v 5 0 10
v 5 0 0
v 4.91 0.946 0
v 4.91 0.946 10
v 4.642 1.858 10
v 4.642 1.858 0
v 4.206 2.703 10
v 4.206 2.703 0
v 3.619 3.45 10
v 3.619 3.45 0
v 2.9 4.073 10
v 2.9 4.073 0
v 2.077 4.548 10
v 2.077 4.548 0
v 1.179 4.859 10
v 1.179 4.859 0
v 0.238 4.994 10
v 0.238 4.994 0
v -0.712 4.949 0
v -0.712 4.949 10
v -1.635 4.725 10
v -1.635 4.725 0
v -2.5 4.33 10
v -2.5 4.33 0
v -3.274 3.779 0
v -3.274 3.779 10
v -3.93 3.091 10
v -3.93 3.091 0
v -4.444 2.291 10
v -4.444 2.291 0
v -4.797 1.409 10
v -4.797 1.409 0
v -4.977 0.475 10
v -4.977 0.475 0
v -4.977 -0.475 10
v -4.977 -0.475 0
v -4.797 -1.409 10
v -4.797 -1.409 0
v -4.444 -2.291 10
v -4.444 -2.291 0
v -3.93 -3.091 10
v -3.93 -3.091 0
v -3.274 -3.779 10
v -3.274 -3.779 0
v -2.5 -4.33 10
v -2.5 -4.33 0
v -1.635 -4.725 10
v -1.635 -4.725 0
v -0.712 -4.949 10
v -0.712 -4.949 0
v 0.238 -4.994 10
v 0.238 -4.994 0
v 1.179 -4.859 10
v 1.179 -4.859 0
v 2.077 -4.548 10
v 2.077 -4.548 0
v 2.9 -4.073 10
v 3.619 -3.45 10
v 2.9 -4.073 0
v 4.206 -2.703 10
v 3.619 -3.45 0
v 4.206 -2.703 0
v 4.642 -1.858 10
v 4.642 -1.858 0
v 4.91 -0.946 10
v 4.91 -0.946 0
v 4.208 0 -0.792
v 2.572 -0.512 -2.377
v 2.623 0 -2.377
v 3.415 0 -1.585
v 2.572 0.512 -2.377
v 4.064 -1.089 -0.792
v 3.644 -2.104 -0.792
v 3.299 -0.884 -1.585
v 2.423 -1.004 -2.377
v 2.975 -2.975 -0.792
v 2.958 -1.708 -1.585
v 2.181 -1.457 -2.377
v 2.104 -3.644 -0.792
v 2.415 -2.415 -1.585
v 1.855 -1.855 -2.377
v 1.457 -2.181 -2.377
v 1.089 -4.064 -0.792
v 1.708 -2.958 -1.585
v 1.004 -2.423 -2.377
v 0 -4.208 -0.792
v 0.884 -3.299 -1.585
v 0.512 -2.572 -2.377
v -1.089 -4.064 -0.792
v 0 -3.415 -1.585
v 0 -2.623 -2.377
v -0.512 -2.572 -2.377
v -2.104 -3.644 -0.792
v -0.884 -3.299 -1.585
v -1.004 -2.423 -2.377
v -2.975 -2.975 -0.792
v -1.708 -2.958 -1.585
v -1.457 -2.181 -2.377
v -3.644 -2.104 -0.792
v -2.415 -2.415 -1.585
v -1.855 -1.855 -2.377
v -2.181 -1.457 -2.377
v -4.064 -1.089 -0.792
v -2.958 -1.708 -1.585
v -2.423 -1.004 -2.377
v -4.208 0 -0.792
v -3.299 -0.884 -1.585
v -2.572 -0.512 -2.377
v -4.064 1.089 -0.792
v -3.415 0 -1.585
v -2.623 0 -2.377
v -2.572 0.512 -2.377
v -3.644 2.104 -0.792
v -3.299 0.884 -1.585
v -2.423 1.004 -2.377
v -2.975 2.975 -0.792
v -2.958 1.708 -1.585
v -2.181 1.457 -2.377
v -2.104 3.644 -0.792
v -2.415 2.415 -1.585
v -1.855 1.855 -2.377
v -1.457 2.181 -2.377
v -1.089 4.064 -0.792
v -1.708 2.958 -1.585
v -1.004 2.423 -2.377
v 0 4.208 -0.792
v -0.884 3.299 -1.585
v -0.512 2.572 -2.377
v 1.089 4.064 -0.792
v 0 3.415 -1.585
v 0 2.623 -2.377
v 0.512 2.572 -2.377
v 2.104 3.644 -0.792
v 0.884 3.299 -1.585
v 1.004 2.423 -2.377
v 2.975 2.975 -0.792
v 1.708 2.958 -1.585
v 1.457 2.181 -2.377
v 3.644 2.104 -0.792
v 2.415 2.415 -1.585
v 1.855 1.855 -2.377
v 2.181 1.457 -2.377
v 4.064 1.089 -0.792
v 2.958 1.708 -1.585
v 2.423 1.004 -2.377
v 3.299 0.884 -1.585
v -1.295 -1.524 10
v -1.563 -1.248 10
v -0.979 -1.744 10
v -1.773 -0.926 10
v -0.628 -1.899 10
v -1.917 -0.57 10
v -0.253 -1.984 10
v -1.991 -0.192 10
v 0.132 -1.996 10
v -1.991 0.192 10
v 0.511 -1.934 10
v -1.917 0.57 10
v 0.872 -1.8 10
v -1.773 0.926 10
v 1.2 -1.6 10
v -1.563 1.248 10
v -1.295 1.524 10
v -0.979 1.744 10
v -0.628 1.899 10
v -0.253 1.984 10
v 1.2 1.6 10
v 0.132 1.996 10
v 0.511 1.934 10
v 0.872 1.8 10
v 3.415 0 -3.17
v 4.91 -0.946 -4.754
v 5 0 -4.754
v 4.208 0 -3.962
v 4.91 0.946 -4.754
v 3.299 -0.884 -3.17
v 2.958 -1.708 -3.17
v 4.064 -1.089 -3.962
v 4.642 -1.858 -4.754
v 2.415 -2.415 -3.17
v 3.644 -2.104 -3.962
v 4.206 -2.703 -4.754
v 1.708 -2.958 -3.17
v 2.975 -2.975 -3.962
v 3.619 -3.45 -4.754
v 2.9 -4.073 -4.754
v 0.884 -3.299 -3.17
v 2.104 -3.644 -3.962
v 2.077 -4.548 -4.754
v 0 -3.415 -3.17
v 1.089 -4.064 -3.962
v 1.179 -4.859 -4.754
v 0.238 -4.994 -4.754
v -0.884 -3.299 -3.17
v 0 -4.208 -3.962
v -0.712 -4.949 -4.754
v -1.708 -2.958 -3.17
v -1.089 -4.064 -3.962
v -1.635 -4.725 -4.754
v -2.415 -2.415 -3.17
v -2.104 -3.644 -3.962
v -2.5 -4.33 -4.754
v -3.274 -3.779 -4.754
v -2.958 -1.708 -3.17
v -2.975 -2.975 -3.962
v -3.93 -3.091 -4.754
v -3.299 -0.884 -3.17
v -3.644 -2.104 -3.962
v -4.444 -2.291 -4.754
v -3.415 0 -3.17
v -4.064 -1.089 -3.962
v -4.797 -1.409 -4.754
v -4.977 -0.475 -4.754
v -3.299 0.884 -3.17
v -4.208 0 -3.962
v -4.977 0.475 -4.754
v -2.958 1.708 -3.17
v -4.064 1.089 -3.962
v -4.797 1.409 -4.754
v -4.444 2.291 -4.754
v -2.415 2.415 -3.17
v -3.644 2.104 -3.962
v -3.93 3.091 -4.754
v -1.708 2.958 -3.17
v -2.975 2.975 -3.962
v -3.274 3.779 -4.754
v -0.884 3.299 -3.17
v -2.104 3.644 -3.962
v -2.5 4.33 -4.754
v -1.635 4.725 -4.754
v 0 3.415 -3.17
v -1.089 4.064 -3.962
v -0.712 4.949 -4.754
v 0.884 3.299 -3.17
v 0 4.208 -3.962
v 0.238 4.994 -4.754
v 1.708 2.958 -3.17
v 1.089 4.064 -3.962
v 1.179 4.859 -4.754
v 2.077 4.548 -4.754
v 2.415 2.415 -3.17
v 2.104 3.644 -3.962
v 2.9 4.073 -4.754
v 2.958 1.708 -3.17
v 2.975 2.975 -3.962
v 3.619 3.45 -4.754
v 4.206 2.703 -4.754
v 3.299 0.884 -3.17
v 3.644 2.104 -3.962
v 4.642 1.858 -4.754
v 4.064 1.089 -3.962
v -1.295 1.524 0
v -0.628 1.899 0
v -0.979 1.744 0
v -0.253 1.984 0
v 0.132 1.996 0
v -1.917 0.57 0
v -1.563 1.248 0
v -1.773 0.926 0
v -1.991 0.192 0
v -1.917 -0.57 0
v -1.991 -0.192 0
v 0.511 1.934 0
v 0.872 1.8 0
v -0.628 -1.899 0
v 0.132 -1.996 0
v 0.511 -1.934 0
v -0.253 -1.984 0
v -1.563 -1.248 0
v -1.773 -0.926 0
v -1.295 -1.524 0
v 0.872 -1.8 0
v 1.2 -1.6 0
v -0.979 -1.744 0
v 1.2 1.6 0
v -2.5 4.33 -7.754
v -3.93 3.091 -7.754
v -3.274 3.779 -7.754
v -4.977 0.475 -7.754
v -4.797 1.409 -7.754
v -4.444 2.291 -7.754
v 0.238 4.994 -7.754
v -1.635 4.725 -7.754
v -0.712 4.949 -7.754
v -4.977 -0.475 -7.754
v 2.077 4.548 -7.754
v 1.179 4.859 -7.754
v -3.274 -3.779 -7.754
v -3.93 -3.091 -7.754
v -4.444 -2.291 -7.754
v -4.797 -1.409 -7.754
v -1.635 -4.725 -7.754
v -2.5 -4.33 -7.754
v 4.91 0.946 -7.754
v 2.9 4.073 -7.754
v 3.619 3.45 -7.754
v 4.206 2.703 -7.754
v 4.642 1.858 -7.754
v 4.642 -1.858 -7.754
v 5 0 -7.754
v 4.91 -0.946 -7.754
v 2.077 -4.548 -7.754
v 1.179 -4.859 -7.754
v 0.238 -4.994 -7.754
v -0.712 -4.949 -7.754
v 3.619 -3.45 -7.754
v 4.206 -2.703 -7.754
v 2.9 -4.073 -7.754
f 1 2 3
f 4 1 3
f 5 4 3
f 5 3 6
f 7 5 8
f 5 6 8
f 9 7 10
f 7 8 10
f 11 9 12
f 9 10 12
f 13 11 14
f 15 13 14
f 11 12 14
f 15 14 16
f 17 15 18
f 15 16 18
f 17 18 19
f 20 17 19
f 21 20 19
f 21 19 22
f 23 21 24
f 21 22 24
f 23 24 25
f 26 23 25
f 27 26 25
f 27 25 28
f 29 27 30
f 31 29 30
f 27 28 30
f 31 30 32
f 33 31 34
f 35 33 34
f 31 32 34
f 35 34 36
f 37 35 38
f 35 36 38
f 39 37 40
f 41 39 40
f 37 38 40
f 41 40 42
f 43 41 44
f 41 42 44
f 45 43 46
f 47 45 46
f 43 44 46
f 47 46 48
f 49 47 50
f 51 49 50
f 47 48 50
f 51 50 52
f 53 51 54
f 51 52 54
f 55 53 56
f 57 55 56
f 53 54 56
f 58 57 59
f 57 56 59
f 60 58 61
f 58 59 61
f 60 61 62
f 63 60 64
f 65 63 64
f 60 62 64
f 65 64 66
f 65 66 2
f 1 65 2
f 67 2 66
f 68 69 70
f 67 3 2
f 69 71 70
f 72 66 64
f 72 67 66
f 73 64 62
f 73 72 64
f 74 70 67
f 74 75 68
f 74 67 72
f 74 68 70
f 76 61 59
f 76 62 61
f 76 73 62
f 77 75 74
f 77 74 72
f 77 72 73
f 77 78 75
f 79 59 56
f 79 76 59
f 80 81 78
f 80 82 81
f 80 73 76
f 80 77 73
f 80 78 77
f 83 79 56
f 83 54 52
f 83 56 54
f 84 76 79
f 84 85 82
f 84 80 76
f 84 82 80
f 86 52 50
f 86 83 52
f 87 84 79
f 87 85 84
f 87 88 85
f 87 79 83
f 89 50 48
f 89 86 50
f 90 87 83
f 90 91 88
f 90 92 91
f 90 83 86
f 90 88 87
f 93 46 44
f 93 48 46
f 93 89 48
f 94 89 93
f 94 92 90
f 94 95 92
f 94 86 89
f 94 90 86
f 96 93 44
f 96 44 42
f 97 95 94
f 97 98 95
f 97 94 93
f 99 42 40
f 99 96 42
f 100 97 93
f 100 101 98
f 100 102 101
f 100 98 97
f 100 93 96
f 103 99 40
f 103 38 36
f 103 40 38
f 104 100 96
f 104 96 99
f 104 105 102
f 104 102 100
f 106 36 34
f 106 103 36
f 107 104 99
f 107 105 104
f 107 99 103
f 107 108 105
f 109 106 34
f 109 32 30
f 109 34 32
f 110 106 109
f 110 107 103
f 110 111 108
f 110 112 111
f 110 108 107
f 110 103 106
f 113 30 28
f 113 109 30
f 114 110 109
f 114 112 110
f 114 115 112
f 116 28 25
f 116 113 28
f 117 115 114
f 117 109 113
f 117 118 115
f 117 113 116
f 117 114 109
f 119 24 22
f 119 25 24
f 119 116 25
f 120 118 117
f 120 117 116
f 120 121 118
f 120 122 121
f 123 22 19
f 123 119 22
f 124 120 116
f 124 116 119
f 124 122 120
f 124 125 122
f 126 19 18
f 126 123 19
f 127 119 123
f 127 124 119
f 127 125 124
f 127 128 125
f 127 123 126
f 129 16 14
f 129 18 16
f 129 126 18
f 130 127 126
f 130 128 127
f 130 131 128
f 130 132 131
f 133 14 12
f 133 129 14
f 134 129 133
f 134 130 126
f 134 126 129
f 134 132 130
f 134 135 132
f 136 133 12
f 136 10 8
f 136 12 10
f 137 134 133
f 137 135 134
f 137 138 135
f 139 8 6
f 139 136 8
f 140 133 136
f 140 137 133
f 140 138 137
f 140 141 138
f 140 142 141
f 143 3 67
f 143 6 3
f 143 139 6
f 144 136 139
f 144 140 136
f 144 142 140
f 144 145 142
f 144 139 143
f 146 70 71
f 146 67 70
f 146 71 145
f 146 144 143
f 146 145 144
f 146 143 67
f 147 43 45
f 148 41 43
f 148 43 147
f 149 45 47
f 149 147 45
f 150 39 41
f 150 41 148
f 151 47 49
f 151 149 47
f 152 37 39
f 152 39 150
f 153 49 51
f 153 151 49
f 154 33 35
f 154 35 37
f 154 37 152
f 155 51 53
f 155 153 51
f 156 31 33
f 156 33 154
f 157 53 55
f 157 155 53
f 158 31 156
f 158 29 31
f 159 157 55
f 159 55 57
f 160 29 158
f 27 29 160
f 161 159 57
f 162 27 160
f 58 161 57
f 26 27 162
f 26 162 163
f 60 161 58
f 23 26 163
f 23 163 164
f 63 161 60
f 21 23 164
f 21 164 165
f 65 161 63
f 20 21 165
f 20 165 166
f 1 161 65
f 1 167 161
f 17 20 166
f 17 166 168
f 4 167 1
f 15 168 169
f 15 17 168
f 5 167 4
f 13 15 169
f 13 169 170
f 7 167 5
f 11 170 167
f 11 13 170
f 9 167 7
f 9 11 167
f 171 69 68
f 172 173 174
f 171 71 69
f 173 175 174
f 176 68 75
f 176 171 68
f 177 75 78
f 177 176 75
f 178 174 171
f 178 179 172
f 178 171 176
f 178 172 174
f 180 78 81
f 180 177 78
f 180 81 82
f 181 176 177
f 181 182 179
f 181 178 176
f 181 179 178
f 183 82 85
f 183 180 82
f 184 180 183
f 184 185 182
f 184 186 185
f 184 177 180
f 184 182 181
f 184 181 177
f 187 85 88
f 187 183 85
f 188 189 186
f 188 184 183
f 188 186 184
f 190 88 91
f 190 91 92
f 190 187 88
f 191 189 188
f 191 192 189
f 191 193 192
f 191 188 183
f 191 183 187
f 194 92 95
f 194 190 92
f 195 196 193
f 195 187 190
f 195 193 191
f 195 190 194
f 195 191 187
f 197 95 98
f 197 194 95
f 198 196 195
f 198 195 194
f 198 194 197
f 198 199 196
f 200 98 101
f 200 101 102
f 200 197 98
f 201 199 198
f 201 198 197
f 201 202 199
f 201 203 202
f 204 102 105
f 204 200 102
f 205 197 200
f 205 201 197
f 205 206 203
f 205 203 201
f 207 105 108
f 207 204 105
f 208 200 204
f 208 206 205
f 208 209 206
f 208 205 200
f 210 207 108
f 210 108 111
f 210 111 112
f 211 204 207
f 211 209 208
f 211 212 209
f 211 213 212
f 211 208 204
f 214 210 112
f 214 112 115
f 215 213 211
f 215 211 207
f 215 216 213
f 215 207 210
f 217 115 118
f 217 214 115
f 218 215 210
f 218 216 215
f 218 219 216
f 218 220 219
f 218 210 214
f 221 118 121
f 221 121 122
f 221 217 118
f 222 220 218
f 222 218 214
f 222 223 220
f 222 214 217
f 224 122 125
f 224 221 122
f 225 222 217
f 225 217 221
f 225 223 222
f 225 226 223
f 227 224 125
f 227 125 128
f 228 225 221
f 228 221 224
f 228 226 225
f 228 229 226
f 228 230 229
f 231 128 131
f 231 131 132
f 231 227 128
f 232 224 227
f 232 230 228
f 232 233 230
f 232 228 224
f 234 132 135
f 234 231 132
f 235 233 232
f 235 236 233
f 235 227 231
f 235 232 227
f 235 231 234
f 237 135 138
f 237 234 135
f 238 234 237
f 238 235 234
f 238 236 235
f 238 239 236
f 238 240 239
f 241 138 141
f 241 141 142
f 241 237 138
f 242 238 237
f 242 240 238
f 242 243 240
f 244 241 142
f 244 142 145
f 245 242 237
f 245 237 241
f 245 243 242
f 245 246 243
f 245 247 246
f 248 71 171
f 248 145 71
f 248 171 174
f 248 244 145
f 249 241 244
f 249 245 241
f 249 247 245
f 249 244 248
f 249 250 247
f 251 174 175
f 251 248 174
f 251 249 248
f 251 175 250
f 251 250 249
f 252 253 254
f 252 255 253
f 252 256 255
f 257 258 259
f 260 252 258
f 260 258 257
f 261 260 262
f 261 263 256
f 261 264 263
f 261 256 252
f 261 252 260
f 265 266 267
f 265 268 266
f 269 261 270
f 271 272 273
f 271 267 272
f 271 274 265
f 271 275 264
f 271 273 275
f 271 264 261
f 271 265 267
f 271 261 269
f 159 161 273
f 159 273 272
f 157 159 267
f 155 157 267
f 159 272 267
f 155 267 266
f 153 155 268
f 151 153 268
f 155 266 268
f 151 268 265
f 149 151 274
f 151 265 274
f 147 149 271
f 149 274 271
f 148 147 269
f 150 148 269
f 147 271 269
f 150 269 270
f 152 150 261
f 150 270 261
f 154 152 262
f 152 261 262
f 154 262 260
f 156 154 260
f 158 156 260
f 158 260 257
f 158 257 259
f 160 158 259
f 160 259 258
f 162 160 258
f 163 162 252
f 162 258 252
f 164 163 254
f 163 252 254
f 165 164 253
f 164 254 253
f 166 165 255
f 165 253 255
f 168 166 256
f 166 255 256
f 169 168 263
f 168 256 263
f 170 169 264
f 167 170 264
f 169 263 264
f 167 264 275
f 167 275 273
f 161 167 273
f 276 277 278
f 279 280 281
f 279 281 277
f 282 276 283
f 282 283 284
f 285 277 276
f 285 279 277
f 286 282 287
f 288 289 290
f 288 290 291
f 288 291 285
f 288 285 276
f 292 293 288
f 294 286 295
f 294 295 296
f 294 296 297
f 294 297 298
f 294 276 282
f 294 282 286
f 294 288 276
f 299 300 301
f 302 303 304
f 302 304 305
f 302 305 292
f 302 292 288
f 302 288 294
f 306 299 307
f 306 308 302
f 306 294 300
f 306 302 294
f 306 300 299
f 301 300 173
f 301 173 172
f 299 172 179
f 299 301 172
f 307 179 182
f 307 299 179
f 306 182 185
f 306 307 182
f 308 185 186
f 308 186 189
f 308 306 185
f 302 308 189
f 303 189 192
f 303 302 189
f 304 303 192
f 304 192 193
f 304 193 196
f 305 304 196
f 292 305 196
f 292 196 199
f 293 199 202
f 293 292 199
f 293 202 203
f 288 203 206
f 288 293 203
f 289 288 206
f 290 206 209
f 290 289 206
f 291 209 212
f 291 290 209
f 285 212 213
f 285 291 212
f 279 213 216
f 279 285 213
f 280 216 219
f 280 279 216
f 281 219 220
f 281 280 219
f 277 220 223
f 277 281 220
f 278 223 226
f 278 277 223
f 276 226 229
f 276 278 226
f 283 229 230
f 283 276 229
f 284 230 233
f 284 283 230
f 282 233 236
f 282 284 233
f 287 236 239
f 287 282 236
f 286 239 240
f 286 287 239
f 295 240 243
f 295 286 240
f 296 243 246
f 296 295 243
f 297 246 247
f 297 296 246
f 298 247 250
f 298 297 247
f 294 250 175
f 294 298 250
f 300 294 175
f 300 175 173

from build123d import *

# Parameters (mm, degrees)
ESBO_O1_R                = 5
RESSALTO_EXTRUS_O1_DEPTH = 10
RESSALTO_EXTRUS_O3_START = 3
ESBO_O4_R                = 5
RESSALTO_EXTRUS_O3_DEPTH = 3


with BuildPart() as part:
    # Esboço1 → Ressalto-extrusão1 (new body)
    with BuildSketch(Plane.XY):
        Circle(ESBO_O1_R)
        with BuildLine():
            Line((1.2, 1.6), (1.2, -1.6))
            ThreePointArc((1.2, -1.6), (-2, 0), (1.2, 1.6))
        make_face(mode=Mode.SUBTRACT)
    extrude(amount=RESSALTO_EXTRUS_O1_DEPTH)

    # Esboço3 → Revolução1 (revolve)
    with BuildSketch(Plane(origin=(0, 0, 0), x_dir=(1, 0, 0), z_dir=(0, 1, 0))):
        Polygon((0, 0), (5, 0), (2.622856892, 2.377143108), (5, 4.754286215), (0, 4.754286215), align=None)
    revolve(axis=Axis((0, 0, 0), (0, 0, -1)))

    # Esboço4 → Ressalto-extrusão3 (add)
    with BuildSketch(Plane(origin=(0, 0, -4.754286215), x_dir=(-1, 0, 0), z_dir=(0, 0, -1)).offset(RESSALTO_EXTRUS_O3_START)):
        with Locations(Location((0, 0, 0), (0, 0, 180))):
            Circle(ESBO_O4_R)
    extrude(amount=-RESSALTO_EXTRUS_O3_DEPTH)


solid = part.part
